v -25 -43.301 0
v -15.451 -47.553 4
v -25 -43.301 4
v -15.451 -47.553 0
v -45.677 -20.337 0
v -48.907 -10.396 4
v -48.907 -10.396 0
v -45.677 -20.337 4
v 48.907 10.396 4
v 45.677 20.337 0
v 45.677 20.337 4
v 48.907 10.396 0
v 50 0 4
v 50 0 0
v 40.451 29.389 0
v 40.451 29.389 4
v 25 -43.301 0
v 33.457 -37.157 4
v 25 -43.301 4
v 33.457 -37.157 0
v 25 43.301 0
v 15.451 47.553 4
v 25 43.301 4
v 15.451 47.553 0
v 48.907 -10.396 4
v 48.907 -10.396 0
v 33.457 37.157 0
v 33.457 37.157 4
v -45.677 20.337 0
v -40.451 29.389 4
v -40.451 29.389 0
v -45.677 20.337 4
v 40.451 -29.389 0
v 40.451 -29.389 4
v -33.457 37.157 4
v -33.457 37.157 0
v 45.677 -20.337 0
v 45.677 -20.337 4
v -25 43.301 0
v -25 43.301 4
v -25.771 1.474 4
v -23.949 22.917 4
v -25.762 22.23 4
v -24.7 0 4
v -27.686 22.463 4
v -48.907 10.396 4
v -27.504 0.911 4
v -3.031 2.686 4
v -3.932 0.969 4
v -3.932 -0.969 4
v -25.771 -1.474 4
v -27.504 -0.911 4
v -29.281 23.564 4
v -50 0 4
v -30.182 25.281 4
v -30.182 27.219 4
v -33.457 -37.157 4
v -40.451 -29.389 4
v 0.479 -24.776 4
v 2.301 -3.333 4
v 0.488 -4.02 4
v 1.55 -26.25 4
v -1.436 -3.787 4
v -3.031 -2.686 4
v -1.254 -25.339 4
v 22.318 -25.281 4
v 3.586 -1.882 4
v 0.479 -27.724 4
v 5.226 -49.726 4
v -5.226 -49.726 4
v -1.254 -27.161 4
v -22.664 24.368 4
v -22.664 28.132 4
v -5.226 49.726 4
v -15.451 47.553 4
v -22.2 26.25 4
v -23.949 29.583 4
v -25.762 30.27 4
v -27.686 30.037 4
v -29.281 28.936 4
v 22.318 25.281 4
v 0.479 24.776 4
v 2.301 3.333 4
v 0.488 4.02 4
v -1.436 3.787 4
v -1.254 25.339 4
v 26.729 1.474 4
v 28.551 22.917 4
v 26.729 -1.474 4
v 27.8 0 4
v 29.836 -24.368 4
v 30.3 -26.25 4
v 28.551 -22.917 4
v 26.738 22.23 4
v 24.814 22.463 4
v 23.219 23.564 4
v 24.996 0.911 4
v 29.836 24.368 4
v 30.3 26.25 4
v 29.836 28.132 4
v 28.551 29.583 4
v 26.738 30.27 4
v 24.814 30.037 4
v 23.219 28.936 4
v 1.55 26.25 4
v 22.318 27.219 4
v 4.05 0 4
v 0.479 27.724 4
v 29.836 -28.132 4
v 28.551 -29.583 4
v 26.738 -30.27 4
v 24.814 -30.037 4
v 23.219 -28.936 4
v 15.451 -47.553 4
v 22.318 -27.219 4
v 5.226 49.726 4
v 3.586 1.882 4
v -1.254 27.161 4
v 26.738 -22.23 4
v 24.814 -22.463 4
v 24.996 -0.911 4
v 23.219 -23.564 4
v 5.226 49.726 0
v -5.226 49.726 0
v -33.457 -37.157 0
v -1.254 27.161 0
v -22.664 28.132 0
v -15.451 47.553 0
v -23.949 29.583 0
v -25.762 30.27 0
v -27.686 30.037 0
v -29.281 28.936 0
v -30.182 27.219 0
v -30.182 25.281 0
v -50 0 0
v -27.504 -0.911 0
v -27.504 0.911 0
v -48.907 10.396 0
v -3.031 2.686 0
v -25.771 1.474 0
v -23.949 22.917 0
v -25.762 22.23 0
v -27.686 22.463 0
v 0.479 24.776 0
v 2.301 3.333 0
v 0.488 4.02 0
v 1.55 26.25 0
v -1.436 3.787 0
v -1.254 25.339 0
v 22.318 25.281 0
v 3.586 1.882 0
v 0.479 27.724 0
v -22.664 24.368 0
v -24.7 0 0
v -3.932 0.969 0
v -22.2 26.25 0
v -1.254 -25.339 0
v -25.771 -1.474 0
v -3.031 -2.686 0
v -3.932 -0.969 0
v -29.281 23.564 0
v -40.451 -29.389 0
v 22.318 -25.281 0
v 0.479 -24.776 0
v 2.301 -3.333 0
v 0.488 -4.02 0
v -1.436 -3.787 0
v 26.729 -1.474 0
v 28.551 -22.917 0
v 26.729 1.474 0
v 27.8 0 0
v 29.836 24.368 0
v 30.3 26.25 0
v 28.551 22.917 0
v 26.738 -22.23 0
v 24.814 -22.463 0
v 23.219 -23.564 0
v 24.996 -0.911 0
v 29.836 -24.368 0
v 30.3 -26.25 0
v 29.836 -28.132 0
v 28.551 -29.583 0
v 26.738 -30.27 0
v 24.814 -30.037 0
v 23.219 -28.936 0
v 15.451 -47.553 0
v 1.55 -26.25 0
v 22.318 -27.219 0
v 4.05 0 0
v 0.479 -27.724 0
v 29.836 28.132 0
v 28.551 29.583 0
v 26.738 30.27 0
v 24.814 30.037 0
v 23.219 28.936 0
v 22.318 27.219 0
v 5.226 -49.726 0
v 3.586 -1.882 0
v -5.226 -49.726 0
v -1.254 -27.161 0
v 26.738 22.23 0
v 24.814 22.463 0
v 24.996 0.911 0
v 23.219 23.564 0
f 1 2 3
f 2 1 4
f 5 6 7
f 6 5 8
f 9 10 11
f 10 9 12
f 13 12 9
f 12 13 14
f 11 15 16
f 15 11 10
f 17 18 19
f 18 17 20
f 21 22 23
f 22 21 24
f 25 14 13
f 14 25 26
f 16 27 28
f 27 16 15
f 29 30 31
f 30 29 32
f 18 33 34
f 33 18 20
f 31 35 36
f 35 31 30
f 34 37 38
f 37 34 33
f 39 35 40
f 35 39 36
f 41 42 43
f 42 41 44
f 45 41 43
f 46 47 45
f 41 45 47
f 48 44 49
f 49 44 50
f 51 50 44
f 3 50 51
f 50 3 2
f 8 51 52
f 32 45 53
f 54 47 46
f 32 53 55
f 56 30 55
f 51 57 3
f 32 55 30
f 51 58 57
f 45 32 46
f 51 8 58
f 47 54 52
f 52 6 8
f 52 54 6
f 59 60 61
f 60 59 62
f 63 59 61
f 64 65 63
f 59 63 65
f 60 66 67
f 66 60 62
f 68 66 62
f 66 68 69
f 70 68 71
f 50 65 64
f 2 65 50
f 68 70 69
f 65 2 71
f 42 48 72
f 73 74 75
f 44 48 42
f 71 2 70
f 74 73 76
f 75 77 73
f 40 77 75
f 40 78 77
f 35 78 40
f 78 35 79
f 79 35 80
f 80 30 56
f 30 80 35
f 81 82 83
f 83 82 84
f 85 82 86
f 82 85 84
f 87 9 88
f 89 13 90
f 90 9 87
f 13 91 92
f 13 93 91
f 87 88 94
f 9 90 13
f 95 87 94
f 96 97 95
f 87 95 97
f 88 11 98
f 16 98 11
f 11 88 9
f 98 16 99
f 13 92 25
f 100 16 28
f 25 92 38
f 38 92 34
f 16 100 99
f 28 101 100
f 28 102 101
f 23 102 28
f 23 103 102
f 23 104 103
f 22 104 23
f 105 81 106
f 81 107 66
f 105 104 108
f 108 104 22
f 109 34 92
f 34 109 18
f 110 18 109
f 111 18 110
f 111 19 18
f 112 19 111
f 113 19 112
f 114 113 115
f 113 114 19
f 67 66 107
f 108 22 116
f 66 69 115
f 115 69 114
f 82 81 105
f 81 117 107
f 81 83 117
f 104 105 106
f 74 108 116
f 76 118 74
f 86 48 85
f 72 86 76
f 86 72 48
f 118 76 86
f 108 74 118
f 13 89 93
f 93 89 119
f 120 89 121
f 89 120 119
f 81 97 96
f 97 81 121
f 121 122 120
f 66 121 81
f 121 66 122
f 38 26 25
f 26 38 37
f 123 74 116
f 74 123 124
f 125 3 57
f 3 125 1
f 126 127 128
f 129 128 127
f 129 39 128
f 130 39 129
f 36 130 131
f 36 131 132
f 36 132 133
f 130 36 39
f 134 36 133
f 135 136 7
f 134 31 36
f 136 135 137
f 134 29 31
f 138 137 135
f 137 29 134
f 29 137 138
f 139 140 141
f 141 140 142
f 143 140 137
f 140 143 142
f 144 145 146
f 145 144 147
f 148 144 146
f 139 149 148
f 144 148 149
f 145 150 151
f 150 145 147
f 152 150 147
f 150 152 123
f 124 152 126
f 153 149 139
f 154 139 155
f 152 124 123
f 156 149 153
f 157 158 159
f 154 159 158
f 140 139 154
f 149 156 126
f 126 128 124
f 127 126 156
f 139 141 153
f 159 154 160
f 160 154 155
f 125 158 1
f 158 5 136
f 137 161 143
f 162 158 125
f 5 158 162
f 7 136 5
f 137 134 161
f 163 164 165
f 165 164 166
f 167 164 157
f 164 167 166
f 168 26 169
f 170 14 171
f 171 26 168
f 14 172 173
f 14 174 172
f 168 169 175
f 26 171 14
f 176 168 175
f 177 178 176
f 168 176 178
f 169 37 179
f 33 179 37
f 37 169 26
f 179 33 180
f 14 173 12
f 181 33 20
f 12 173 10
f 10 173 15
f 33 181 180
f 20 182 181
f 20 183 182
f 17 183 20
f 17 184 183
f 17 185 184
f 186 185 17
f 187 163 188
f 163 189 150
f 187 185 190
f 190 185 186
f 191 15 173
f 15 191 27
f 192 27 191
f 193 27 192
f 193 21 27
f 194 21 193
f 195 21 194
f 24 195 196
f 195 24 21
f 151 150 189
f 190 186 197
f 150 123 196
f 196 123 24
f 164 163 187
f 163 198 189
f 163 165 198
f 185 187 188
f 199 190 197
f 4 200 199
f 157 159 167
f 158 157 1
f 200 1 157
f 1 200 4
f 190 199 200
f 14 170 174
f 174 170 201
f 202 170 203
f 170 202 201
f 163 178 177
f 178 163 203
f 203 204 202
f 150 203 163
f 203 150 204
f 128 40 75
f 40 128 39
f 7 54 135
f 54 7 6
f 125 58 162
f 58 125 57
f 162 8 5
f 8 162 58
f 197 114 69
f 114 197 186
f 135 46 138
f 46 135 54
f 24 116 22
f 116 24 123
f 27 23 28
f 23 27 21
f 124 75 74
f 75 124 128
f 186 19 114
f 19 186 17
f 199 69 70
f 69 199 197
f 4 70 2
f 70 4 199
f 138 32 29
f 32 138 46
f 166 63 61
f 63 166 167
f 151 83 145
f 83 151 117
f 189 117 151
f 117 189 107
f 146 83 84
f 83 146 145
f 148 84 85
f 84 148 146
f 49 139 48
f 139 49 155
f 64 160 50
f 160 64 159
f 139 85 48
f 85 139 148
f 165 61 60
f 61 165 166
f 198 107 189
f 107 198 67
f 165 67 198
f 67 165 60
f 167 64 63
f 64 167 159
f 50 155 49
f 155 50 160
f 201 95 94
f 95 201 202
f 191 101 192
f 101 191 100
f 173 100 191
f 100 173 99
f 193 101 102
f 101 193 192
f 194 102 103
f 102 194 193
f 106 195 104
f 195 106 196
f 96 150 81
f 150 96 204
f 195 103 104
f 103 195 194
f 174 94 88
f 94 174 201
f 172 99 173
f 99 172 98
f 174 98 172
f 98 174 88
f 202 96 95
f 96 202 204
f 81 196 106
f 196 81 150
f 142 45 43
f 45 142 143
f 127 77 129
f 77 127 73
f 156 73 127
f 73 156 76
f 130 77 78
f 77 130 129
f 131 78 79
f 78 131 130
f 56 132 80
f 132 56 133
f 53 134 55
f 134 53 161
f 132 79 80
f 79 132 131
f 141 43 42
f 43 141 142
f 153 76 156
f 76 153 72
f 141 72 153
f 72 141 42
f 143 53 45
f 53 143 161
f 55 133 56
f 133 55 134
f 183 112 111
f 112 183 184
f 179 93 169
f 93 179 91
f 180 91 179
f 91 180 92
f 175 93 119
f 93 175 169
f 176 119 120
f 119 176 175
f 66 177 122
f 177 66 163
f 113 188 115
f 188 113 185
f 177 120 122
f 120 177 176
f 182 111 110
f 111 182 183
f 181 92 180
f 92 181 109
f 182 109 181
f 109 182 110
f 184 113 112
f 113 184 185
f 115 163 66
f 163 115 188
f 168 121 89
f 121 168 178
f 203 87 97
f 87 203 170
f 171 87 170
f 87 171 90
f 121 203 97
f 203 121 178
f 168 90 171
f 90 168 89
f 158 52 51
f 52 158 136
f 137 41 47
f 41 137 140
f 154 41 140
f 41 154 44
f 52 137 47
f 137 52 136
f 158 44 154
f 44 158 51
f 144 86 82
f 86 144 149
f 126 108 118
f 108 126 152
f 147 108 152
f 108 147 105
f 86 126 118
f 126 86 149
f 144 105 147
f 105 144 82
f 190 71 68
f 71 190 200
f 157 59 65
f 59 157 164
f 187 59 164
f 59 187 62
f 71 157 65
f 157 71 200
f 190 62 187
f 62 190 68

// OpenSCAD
echo(version=version());

// units in mm
BASE_WIDTH = 113.0;
BASE_HEIGHT = 53.0;
BASE_WALL = 4.0;
INNER_RIDGE_HEIGHT = 6.0;
INNER_RIDGE_WIDTH = 2.0;

PLATFORM_WIDTH = 100.0;
PLATFORM_HEIGHT = 4.0;

SUPPORT_WIDTH = BASE_WIDTH - INNER_RIDGE_WIDTH * 4;
SUPPORT_HEIGHT = 20.0;

ROD_WIDTH = 8.1; // m8 
ROD_DEPTH = 10.0;
ROD_PLACEMENT = (BASE_WIDTH - INNER_RIDGE_WIDTH * 4) / 4;

BEARING_HEIGHT = 25.0;
BEARING_WIDTH = 15.2;
ROD_SHAFT_HEIGHT = BEARING_HEIGHT;
ROD_SHAFT_WIDTH = BEARING_WIDTH + 4;

STEPPER_ROD_NUT_WIDTH = 13.0;
STEPPER_ROD_HEIGHT = ROD_SHAFT_HEIGHT;
STEPPER_ROD_NUT_WALL = STEPPER_ROD_NUT_WIDTH + 4;

// stepper dims
STEPPER_WIDTH = 42.3;
STEPPER_HEIGHT = 33.0;
STEPPER_SCREW_SPACE = 31.0; 
STEPPER_HALF_SPACE = STEPPER_SCREW_SPACE / 2;
STEPPER_SCREW_SIZE = 3.1; // m3
STEPPER_SHAFT = 7.0;

// top shelf
difference() {
    cylinder(h=PLATFORM_HEIGHT, d=PLATFORM_WIDTH);
    
    // stepper shaft
    cylinder(h=PLATFORM_HEIGHT, d=ROD_WIDTH);
    
    // support rods
    translate([ROD_PLACEMENT, ROD_PLACEMENT, 0])
        cylinder(h=ROD_DEPTH, d=ROD_WIDTH);
    translate([-1 * ROD_PLACEMENT, ROD_PLACEMENT, 0])
        cylinder(h=ROD_DEPTH, d=ROD_WIDTH);
    translate([ROD_PLACEMENT, -1 * ROD_PLACEMENT, 0])
        cylinder(h=ROD_DEPTH, d=ROD_WIDTH);
    
     // bottom/top connections
     translate([ROD_PLACEMENT, 0, 0])
        cylinder(h=PLATFORM_HEIGHT, d=STEPPER_SCREW_SIZE);
     translate([-1 * ROD_PLACEMENT, 0, 0])
        cylinder(h=PLATFORM_HEIGHT, d=STEPPER_SCREW_SIZE);
     translate([0, ROD_PLACEMENT, 0])
        cylinder(h=PLATFORM_HEIGHT, d=STEPPER_SCREW_SIZE);
    translate([0, -1 * ROD_PLACEMENT, 0])
        cylinder(h=PLATFORM_HEIGHT, d=STEPPER_SCREW_SIZE);
}
